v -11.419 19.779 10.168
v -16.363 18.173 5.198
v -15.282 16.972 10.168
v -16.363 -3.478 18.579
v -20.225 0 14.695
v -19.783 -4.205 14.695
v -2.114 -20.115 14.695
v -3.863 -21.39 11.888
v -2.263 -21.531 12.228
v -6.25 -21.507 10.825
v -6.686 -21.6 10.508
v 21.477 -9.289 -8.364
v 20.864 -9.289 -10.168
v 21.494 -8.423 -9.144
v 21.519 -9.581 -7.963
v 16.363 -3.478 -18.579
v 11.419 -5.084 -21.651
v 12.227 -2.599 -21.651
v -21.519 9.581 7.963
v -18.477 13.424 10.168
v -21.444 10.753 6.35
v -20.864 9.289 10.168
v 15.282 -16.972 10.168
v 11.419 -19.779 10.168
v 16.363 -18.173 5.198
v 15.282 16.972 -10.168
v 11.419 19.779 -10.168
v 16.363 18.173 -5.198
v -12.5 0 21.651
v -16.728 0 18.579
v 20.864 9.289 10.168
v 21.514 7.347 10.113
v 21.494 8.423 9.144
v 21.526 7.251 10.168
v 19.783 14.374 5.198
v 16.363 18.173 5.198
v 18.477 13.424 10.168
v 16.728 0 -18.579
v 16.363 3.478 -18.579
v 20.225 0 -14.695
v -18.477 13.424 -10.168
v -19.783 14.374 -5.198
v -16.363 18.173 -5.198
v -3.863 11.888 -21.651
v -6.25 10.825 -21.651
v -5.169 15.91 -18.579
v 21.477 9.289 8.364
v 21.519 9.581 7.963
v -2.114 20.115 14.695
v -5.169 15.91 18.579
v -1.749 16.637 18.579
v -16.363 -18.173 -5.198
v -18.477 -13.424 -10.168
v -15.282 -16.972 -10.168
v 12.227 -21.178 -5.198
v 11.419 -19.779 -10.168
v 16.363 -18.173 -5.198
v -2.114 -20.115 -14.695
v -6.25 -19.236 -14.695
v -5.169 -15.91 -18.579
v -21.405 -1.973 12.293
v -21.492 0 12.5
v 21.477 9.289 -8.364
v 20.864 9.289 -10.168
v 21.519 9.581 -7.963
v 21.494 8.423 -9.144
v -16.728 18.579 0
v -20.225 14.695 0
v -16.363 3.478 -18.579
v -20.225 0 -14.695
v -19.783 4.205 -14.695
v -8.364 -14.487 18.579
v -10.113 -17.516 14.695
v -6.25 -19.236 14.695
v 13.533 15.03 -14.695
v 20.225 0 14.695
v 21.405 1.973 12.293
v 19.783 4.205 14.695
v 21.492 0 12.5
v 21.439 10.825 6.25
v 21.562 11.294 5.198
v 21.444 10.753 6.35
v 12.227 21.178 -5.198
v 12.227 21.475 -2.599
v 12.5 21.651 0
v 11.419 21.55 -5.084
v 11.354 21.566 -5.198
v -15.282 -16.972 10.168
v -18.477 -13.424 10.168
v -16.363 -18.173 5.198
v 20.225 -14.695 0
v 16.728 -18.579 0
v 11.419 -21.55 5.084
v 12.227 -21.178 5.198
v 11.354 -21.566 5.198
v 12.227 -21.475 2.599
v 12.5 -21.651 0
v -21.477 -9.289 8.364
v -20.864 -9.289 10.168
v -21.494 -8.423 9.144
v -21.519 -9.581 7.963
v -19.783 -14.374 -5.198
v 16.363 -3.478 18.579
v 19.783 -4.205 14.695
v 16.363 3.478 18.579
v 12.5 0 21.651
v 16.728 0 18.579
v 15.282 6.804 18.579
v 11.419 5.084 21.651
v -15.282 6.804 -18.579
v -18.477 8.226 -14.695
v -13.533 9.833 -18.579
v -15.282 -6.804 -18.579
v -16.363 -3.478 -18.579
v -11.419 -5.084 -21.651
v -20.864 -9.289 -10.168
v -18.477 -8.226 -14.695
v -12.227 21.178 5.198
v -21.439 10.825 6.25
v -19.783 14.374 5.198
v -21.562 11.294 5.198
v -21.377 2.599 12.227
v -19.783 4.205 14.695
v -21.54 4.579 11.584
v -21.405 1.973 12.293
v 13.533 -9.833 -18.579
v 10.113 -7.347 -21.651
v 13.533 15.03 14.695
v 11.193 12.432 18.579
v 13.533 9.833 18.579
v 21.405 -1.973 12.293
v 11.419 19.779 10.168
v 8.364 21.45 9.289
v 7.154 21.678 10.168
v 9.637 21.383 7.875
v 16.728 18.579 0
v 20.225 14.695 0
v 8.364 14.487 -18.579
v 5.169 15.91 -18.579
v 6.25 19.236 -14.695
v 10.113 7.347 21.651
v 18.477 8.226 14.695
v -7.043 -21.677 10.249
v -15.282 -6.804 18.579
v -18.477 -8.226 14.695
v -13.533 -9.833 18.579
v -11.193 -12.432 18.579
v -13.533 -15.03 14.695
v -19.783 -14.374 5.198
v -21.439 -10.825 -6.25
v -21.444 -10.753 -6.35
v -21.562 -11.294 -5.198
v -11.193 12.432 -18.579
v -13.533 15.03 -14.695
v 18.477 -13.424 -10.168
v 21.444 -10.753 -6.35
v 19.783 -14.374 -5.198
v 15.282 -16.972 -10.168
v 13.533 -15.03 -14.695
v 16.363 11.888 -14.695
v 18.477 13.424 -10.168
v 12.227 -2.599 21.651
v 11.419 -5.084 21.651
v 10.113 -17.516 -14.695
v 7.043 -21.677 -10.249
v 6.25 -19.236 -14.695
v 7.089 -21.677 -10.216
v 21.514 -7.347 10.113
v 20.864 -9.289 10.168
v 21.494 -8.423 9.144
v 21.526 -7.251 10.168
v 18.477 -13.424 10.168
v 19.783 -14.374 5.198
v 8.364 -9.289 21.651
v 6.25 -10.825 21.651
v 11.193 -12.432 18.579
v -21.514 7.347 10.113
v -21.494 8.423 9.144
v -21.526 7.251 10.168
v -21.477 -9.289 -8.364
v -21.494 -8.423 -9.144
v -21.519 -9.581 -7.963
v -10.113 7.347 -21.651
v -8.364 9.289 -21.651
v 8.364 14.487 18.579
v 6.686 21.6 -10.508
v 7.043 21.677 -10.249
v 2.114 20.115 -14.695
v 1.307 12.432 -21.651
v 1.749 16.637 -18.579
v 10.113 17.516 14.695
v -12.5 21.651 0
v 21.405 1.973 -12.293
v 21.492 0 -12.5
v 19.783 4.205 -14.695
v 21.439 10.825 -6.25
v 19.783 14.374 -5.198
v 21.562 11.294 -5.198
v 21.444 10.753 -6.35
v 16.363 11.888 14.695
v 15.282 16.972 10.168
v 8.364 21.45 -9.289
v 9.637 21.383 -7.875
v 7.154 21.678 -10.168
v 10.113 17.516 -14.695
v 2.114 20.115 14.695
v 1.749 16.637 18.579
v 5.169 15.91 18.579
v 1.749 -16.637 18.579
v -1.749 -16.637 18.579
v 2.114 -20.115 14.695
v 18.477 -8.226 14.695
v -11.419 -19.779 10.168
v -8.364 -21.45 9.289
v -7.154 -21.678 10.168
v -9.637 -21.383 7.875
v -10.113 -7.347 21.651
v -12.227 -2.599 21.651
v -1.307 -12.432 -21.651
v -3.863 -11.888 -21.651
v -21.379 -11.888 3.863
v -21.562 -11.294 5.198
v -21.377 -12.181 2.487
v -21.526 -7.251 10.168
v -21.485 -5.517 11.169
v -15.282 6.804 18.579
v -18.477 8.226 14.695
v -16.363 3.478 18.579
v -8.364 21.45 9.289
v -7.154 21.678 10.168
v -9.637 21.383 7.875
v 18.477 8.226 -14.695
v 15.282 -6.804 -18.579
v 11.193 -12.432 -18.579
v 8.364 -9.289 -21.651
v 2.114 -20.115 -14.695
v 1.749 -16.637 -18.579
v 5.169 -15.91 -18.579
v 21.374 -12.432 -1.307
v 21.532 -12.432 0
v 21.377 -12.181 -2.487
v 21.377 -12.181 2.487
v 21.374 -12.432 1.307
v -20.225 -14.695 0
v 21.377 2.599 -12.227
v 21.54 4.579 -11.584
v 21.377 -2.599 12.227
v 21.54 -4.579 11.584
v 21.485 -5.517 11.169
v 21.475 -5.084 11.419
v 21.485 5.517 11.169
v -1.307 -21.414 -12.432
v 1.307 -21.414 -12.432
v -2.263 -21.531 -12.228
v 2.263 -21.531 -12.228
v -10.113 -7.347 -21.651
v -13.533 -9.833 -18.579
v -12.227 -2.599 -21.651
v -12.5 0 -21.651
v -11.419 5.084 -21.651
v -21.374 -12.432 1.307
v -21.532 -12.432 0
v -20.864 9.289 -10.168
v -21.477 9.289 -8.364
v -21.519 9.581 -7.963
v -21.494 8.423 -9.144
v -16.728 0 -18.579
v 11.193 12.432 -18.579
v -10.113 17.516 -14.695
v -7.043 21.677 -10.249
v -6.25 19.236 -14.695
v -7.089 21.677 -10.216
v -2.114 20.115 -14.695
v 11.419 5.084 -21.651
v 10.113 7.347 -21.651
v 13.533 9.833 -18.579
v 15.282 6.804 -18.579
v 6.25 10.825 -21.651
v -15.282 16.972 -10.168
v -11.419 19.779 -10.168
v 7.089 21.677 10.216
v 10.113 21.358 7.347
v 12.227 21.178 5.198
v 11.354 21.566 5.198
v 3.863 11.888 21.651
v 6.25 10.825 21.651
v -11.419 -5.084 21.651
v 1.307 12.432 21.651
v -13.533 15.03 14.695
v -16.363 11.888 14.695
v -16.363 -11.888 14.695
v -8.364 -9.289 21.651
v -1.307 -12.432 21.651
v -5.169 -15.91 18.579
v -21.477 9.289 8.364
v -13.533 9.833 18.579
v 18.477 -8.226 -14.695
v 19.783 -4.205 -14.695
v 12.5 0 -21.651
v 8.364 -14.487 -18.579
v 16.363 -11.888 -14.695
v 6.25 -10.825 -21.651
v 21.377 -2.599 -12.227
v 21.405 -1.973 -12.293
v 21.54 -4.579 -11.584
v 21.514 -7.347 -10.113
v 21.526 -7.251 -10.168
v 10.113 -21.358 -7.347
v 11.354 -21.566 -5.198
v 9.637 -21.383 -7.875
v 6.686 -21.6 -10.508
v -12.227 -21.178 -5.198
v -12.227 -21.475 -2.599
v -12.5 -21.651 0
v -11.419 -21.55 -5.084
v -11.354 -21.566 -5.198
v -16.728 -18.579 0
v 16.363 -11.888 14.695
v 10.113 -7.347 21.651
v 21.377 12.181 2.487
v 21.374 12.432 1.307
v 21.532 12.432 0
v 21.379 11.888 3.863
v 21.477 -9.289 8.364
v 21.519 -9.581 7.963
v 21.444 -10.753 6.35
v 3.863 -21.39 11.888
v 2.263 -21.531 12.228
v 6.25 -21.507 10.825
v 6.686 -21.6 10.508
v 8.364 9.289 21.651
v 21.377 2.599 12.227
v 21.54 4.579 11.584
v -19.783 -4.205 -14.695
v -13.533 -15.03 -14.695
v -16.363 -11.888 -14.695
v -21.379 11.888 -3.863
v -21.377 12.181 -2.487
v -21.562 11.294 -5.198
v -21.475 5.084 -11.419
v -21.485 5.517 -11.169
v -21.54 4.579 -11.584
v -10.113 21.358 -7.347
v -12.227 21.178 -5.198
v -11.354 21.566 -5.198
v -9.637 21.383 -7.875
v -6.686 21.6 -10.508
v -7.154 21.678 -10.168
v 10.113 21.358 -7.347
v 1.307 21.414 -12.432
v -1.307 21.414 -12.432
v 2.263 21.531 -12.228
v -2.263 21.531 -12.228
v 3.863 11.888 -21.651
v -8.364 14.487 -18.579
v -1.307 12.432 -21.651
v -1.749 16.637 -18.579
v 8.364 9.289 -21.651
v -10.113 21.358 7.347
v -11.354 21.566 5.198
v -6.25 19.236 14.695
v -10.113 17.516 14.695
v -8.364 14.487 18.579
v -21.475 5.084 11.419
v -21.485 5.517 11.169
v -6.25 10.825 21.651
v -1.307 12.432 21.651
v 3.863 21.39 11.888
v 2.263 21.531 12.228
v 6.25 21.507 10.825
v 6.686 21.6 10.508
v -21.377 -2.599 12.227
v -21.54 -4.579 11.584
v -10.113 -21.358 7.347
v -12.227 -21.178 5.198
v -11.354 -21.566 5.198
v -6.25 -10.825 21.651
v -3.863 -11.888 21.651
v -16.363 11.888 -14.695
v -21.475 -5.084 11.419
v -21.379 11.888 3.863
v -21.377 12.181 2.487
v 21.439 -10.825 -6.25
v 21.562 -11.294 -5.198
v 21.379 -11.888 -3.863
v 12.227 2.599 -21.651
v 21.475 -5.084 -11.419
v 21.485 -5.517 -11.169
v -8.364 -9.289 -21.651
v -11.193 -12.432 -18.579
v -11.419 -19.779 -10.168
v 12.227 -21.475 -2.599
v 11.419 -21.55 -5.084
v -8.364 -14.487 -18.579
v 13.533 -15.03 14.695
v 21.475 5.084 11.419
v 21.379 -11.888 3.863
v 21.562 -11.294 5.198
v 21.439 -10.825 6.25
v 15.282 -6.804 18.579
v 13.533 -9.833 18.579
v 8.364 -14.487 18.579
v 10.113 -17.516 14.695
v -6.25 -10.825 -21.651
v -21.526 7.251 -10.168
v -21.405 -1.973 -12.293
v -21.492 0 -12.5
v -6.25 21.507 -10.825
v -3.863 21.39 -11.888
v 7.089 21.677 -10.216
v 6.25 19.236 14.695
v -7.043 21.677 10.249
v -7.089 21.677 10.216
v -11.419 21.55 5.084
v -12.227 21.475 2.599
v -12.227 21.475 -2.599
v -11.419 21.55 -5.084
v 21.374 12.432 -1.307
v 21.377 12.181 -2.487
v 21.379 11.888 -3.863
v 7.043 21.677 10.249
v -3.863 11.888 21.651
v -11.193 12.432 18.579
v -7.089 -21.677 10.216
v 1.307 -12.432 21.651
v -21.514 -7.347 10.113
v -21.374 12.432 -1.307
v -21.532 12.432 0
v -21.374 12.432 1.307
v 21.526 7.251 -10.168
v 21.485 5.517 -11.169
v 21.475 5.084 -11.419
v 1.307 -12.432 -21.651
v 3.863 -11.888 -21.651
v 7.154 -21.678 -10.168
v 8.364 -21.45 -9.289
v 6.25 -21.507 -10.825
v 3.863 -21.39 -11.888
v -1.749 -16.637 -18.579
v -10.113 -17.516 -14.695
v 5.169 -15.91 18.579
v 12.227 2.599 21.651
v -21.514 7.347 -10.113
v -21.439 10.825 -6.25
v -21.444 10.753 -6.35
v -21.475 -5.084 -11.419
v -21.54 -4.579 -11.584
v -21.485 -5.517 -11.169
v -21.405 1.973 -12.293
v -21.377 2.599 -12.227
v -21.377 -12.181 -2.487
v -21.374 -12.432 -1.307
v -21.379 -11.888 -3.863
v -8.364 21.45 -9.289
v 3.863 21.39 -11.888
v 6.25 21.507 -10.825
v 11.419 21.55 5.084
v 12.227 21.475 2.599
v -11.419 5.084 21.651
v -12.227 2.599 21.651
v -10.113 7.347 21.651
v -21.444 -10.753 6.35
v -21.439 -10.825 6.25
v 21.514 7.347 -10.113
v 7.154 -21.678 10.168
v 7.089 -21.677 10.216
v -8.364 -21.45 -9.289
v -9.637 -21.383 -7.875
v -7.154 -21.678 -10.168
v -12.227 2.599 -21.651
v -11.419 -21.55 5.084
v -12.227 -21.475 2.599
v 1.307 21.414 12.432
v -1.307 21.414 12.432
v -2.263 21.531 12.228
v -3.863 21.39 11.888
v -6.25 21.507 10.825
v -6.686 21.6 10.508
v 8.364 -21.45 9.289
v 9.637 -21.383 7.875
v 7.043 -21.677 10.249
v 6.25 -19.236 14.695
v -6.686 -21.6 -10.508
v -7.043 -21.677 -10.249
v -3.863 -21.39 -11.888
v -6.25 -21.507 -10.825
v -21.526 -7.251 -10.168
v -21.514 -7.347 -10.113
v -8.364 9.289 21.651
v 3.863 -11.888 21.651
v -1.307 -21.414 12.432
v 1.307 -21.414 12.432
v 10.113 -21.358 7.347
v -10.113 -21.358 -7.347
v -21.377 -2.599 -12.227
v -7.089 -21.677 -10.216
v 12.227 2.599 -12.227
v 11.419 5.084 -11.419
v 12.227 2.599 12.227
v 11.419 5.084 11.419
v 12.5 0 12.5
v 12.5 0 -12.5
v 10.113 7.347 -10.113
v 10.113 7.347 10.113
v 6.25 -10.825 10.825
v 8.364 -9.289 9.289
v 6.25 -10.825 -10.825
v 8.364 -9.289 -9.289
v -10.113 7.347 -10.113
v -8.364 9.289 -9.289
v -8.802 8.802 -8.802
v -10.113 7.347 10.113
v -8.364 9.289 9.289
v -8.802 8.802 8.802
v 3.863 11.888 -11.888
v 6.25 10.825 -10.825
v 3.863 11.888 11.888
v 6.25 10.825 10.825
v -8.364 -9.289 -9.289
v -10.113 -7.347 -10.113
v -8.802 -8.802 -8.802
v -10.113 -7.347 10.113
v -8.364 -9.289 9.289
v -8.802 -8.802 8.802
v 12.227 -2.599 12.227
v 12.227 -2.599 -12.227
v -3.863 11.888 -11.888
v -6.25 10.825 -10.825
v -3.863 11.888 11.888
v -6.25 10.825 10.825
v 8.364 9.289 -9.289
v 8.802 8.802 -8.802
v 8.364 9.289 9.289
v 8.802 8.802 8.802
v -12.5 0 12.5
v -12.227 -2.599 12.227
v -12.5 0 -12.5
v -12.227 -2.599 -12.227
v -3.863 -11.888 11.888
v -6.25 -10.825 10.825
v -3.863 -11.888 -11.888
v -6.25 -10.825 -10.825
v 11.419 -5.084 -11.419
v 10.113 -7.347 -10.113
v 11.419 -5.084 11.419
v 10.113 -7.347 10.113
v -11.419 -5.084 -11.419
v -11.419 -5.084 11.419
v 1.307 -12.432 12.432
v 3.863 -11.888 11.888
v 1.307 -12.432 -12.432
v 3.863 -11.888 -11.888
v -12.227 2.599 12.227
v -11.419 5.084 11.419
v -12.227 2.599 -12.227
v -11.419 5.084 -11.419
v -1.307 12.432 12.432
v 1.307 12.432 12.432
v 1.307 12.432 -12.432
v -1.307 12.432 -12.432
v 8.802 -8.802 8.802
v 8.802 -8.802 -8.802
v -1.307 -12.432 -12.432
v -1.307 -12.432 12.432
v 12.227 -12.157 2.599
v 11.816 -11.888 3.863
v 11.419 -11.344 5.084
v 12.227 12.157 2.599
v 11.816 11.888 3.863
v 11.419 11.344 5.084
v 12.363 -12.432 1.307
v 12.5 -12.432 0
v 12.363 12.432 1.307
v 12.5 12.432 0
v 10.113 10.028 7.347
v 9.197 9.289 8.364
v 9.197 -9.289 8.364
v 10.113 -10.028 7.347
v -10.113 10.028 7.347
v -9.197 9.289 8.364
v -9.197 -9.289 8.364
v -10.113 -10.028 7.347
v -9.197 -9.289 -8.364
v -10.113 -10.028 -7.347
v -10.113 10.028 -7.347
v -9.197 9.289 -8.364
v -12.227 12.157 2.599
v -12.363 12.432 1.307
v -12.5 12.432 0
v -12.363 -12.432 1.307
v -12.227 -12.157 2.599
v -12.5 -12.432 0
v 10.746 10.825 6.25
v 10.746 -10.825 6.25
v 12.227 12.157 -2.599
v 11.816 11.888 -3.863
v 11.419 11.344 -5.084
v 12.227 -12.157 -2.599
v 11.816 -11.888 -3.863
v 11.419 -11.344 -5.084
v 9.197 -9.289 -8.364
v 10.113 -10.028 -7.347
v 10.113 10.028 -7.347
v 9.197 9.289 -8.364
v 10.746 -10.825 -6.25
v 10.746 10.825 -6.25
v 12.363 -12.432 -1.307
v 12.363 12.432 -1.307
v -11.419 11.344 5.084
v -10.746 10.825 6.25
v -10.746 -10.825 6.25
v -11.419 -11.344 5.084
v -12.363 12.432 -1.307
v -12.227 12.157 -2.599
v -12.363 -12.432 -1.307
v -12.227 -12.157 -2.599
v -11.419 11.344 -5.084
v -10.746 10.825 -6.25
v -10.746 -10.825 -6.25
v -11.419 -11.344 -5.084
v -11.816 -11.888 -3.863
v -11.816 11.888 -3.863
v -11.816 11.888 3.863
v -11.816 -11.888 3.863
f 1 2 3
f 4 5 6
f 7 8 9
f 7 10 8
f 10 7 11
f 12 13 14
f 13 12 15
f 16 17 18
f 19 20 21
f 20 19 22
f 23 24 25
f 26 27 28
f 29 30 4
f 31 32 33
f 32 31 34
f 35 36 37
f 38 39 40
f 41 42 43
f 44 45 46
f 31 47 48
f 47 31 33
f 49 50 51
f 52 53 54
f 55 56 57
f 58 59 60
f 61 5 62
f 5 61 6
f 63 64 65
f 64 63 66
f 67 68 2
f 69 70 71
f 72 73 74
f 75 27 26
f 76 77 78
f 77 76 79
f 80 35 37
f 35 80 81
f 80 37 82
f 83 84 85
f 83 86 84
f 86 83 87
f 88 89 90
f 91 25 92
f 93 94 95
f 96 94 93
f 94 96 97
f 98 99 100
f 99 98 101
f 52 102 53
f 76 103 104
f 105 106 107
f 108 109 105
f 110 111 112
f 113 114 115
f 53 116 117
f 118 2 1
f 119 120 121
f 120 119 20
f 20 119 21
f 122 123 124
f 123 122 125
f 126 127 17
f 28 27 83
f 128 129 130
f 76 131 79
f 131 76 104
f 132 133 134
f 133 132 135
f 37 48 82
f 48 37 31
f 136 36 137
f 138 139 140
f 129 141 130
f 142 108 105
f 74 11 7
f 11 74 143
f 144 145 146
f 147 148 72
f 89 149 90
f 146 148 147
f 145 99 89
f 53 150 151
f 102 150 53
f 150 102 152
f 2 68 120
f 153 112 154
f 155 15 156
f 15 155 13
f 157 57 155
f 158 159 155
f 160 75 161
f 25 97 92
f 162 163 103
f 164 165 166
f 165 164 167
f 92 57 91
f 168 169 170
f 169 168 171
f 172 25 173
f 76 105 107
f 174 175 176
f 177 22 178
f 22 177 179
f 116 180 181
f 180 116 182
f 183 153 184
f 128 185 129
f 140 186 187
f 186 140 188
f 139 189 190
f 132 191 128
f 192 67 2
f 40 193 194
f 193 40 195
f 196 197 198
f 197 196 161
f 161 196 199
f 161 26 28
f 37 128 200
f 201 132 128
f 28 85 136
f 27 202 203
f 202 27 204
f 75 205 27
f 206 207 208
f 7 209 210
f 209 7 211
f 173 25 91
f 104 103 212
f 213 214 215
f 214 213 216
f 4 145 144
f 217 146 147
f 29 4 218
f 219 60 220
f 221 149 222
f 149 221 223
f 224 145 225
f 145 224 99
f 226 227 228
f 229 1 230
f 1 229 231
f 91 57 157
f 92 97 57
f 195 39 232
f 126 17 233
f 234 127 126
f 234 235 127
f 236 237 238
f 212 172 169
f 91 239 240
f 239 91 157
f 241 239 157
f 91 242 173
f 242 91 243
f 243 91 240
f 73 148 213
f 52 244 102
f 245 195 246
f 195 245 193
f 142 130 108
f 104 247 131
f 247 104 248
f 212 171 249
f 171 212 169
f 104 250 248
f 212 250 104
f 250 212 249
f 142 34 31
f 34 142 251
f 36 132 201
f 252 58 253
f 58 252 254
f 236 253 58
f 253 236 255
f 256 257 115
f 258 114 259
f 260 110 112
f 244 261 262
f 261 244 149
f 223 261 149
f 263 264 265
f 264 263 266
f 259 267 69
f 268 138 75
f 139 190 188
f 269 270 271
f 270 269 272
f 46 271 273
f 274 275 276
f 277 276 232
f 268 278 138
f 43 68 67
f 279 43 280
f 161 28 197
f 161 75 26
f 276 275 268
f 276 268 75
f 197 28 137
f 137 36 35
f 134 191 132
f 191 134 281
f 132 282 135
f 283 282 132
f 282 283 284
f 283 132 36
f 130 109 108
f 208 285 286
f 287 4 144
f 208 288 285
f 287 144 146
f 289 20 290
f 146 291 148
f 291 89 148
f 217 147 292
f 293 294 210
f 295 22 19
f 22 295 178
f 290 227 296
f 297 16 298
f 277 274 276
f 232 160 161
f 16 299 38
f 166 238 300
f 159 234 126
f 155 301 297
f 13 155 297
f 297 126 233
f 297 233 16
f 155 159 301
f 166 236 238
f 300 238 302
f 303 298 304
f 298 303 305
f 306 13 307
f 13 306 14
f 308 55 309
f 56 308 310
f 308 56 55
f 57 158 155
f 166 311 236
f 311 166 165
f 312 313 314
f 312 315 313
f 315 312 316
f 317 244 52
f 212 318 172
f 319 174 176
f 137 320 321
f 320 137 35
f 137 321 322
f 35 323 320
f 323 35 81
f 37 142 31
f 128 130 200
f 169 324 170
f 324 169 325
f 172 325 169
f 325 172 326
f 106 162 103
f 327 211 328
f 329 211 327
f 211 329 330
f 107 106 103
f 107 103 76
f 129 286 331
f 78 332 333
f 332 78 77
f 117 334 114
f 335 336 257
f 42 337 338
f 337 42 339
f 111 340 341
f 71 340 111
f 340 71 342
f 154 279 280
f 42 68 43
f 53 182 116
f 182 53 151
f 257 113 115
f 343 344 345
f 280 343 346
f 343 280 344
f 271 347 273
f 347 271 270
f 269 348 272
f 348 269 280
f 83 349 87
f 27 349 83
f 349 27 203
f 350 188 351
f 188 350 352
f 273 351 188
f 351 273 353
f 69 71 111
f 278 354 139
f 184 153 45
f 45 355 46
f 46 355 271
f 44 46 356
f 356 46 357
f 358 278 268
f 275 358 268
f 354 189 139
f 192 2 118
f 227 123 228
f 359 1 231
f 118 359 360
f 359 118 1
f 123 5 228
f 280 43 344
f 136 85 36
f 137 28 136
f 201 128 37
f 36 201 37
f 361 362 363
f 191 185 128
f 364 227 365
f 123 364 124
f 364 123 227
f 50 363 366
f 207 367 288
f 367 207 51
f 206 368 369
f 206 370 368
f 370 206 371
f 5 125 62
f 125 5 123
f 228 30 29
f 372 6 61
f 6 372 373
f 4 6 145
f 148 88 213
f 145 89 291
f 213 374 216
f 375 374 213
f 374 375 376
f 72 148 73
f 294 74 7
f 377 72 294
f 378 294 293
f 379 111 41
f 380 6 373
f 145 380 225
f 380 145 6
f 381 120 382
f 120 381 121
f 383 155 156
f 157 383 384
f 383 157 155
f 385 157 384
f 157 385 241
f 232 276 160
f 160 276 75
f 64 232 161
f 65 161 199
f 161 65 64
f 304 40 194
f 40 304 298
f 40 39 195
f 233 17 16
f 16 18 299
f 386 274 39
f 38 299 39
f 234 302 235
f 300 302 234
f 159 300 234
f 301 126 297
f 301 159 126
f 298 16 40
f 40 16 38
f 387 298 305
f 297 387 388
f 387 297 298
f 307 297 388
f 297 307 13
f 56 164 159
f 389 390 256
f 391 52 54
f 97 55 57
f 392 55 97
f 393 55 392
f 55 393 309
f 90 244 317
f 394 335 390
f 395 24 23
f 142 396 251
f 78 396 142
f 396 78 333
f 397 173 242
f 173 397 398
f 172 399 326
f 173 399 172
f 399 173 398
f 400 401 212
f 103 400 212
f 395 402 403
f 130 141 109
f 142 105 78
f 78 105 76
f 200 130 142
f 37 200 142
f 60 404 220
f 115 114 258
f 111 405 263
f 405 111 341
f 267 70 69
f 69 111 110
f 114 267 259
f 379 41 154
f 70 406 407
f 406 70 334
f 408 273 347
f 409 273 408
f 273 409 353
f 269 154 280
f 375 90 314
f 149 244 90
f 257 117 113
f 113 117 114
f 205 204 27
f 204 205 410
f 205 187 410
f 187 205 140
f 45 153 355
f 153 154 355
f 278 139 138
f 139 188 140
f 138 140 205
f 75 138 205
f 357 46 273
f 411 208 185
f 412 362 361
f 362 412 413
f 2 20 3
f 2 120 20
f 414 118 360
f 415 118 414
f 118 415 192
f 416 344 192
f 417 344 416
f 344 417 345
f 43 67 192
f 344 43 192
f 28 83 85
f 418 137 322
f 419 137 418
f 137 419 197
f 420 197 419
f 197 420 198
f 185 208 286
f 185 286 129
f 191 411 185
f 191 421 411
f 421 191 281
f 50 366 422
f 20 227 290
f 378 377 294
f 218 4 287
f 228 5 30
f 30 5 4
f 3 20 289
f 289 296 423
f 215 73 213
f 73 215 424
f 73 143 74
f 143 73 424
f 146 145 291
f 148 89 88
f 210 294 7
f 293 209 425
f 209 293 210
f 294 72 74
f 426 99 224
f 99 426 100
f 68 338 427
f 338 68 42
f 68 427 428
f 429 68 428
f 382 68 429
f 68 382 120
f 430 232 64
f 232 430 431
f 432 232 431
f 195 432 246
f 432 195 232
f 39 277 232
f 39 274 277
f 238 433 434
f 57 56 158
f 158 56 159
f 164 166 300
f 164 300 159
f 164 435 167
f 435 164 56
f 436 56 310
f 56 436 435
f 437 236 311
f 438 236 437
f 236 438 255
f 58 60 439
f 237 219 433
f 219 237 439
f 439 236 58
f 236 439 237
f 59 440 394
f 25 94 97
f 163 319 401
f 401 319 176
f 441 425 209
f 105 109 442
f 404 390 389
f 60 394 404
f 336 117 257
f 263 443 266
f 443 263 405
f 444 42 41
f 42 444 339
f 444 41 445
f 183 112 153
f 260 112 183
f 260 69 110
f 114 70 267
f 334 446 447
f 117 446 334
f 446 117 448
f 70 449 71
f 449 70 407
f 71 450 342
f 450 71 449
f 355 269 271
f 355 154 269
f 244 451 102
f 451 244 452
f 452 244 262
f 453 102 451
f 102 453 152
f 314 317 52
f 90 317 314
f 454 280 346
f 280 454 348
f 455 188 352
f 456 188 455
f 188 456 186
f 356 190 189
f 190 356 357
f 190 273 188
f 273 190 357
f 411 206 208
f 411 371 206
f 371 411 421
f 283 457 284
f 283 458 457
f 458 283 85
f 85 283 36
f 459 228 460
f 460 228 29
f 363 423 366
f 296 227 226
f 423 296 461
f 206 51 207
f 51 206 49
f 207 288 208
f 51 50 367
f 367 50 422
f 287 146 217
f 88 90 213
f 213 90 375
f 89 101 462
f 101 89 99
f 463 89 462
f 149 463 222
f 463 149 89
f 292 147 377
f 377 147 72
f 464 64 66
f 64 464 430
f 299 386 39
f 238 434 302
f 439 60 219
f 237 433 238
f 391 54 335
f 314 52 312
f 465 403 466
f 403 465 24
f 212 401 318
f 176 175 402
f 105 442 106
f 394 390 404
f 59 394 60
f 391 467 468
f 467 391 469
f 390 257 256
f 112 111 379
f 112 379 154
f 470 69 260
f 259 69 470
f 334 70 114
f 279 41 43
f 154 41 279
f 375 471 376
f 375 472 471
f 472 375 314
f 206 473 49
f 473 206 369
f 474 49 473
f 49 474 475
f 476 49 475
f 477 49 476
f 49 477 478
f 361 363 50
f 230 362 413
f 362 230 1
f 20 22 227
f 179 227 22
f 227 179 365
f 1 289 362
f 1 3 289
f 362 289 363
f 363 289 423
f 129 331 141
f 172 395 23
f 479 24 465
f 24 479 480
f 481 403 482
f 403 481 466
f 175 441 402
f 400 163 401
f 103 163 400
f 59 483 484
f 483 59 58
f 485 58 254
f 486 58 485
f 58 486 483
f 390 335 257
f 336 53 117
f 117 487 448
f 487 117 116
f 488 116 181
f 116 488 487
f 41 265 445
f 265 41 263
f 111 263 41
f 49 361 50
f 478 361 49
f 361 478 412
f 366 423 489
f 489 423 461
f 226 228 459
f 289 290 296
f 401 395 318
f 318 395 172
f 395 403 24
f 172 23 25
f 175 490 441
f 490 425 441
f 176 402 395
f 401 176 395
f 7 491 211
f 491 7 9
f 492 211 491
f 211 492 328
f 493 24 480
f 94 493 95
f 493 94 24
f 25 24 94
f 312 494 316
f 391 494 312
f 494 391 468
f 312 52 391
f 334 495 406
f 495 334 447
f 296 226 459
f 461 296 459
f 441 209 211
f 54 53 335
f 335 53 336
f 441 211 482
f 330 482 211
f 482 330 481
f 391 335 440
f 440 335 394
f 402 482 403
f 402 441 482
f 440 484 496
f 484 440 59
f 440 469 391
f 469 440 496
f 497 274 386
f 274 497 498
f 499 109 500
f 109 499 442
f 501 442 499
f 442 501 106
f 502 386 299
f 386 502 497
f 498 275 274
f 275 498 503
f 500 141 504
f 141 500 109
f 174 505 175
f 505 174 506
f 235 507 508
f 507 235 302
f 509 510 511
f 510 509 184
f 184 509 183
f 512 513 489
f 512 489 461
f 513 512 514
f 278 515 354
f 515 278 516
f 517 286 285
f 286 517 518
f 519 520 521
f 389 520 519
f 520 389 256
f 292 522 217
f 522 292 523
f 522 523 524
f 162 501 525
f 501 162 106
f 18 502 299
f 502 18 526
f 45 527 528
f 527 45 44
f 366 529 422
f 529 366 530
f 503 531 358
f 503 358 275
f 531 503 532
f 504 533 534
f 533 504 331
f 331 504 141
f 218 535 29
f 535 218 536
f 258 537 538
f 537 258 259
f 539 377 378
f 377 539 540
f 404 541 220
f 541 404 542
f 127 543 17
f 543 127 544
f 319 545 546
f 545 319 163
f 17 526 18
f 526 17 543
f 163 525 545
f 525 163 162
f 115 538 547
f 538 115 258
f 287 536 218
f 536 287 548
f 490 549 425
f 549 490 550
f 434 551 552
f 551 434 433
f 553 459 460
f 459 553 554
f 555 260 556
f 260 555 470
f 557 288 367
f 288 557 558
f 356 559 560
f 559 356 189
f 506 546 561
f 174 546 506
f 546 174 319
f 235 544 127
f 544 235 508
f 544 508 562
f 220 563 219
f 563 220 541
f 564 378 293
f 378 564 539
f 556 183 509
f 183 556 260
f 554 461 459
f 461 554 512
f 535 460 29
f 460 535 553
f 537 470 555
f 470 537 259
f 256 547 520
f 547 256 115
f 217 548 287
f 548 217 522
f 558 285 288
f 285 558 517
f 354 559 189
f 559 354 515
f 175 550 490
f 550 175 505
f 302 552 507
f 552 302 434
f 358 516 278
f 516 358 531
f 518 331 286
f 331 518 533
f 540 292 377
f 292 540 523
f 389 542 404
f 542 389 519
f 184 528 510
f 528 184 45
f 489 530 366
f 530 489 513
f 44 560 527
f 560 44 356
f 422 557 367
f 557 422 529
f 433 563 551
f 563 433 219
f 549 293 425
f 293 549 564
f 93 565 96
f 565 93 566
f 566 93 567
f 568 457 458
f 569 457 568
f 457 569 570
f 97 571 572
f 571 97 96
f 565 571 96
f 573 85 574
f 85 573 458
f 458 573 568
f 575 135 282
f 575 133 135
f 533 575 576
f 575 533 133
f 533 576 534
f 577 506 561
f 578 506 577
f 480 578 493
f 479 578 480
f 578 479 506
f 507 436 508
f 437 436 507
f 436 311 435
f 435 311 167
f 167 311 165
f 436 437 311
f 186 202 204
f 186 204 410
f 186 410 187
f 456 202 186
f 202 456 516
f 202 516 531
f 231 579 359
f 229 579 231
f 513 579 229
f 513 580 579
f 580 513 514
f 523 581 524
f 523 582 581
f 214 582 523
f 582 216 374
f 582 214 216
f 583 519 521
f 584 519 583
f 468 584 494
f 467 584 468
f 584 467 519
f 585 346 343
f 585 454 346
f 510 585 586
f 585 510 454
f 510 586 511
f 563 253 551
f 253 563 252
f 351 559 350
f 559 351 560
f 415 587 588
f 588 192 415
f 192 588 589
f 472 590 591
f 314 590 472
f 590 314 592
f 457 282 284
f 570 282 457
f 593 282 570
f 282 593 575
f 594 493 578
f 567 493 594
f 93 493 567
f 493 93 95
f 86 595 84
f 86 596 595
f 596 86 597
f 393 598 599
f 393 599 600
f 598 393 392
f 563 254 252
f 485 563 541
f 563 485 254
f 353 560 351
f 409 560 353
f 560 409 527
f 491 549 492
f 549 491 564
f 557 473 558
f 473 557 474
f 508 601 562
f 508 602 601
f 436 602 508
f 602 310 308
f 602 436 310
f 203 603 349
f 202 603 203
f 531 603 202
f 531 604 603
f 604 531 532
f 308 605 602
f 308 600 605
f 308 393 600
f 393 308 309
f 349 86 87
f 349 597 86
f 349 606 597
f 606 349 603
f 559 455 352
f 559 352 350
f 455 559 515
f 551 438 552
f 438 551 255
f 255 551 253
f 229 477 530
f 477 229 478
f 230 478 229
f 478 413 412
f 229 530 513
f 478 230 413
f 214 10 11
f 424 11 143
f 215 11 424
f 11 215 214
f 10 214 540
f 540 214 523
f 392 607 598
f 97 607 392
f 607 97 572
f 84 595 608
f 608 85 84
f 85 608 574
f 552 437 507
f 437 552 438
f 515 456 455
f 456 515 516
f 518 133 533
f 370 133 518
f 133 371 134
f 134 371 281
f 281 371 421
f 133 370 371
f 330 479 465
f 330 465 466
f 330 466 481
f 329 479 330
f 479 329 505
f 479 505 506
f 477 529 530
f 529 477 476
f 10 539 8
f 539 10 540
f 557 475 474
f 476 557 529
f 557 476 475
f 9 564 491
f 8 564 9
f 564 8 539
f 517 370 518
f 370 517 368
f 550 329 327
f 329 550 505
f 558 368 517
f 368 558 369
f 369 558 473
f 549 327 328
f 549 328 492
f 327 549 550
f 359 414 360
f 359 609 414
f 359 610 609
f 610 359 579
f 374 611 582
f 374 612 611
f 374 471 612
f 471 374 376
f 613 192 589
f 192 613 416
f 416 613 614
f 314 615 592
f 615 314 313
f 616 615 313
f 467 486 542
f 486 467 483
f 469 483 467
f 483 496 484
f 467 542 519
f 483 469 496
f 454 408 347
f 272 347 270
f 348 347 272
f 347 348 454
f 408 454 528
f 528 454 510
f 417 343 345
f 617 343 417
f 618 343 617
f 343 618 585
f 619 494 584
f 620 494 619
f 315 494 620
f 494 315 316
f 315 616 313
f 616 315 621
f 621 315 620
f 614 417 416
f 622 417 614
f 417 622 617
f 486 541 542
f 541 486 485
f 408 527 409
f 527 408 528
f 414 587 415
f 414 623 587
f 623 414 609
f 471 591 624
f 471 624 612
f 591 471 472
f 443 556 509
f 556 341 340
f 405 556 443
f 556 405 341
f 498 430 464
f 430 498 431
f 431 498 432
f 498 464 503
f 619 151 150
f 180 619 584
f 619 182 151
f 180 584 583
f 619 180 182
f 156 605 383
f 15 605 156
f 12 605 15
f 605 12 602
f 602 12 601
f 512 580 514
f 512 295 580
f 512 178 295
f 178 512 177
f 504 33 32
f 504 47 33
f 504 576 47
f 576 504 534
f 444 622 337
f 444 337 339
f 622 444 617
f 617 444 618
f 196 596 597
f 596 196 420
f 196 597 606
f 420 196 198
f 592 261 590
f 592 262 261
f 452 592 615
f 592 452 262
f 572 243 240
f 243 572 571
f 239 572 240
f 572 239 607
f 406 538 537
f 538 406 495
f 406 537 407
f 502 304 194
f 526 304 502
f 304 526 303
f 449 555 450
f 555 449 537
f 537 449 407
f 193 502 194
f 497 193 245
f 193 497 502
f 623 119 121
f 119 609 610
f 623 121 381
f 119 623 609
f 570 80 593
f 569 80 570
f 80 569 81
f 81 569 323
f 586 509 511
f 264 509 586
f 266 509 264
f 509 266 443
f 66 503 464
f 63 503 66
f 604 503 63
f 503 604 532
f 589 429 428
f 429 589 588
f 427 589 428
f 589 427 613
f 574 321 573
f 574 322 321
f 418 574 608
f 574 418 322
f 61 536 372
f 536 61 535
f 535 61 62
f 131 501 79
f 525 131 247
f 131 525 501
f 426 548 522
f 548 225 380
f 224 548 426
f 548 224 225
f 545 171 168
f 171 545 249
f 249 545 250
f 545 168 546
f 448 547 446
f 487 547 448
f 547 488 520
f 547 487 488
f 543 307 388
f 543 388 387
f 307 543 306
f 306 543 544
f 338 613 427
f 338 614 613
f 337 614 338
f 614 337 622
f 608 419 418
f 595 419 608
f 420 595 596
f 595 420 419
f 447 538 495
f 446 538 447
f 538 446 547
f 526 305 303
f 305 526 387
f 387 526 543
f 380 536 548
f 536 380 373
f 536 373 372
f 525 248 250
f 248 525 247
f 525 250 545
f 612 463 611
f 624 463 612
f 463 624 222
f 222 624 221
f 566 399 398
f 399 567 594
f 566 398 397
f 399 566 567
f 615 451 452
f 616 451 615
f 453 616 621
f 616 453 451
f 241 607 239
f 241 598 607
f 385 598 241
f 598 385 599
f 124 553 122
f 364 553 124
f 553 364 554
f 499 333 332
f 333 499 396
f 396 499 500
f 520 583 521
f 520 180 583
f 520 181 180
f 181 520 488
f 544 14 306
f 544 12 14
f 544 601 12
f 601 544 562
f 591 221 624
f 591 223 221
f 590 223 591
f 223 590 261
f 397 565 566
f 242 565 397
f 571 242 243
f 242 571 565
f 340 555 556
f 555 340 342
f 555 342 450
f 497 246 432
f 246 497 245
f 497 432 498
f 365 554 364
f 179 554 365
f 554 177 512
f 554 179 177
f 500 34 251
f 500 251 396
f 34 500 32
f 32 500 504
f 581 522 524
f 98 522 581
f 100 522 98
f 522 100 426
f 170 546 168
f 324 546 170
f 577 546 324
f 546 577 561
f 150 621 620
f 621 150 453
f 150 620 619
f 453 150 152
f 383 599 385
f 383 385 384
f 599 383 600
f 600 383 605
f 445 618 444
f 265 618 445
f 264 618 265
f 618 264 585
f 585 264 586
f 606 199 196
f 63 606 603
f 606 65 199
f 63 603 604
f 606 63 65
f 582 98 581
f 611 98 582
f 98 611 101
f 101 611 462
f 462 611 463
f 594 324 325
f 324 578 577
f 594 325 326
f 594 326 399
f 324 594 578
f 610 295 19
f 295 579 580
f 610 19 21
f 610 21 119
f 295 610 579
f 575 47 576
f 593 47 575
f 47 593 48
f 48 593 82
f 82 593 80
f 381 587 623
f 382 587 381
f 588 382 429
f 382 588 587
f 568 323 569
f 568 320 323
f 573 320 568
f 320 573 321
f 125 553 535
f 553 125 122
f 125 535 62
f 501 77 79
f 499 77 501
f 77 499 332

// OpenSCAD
module example001()
{
	function r_from_dia(d) = d / 2;

	module rotcy(rot, r, h) {
		rotate(90, rot)
			cylinder(r = r, h = h, center = true);
	}

	difference() {
		sphere(r = r_from_dia(size));
		rotcy([0, 0, 0], cy_r, cy_h);
		rotcy([1, 0, 0], cy_r, cy_h);
		rotcy([0, 1, 0], cy_r, cy_h);
	}

	size = 50;
	hole = 25;

	cy_r = r_from_dia(hole);
	cy_h = r_from_dia(size * 2.5);
}

example001();
